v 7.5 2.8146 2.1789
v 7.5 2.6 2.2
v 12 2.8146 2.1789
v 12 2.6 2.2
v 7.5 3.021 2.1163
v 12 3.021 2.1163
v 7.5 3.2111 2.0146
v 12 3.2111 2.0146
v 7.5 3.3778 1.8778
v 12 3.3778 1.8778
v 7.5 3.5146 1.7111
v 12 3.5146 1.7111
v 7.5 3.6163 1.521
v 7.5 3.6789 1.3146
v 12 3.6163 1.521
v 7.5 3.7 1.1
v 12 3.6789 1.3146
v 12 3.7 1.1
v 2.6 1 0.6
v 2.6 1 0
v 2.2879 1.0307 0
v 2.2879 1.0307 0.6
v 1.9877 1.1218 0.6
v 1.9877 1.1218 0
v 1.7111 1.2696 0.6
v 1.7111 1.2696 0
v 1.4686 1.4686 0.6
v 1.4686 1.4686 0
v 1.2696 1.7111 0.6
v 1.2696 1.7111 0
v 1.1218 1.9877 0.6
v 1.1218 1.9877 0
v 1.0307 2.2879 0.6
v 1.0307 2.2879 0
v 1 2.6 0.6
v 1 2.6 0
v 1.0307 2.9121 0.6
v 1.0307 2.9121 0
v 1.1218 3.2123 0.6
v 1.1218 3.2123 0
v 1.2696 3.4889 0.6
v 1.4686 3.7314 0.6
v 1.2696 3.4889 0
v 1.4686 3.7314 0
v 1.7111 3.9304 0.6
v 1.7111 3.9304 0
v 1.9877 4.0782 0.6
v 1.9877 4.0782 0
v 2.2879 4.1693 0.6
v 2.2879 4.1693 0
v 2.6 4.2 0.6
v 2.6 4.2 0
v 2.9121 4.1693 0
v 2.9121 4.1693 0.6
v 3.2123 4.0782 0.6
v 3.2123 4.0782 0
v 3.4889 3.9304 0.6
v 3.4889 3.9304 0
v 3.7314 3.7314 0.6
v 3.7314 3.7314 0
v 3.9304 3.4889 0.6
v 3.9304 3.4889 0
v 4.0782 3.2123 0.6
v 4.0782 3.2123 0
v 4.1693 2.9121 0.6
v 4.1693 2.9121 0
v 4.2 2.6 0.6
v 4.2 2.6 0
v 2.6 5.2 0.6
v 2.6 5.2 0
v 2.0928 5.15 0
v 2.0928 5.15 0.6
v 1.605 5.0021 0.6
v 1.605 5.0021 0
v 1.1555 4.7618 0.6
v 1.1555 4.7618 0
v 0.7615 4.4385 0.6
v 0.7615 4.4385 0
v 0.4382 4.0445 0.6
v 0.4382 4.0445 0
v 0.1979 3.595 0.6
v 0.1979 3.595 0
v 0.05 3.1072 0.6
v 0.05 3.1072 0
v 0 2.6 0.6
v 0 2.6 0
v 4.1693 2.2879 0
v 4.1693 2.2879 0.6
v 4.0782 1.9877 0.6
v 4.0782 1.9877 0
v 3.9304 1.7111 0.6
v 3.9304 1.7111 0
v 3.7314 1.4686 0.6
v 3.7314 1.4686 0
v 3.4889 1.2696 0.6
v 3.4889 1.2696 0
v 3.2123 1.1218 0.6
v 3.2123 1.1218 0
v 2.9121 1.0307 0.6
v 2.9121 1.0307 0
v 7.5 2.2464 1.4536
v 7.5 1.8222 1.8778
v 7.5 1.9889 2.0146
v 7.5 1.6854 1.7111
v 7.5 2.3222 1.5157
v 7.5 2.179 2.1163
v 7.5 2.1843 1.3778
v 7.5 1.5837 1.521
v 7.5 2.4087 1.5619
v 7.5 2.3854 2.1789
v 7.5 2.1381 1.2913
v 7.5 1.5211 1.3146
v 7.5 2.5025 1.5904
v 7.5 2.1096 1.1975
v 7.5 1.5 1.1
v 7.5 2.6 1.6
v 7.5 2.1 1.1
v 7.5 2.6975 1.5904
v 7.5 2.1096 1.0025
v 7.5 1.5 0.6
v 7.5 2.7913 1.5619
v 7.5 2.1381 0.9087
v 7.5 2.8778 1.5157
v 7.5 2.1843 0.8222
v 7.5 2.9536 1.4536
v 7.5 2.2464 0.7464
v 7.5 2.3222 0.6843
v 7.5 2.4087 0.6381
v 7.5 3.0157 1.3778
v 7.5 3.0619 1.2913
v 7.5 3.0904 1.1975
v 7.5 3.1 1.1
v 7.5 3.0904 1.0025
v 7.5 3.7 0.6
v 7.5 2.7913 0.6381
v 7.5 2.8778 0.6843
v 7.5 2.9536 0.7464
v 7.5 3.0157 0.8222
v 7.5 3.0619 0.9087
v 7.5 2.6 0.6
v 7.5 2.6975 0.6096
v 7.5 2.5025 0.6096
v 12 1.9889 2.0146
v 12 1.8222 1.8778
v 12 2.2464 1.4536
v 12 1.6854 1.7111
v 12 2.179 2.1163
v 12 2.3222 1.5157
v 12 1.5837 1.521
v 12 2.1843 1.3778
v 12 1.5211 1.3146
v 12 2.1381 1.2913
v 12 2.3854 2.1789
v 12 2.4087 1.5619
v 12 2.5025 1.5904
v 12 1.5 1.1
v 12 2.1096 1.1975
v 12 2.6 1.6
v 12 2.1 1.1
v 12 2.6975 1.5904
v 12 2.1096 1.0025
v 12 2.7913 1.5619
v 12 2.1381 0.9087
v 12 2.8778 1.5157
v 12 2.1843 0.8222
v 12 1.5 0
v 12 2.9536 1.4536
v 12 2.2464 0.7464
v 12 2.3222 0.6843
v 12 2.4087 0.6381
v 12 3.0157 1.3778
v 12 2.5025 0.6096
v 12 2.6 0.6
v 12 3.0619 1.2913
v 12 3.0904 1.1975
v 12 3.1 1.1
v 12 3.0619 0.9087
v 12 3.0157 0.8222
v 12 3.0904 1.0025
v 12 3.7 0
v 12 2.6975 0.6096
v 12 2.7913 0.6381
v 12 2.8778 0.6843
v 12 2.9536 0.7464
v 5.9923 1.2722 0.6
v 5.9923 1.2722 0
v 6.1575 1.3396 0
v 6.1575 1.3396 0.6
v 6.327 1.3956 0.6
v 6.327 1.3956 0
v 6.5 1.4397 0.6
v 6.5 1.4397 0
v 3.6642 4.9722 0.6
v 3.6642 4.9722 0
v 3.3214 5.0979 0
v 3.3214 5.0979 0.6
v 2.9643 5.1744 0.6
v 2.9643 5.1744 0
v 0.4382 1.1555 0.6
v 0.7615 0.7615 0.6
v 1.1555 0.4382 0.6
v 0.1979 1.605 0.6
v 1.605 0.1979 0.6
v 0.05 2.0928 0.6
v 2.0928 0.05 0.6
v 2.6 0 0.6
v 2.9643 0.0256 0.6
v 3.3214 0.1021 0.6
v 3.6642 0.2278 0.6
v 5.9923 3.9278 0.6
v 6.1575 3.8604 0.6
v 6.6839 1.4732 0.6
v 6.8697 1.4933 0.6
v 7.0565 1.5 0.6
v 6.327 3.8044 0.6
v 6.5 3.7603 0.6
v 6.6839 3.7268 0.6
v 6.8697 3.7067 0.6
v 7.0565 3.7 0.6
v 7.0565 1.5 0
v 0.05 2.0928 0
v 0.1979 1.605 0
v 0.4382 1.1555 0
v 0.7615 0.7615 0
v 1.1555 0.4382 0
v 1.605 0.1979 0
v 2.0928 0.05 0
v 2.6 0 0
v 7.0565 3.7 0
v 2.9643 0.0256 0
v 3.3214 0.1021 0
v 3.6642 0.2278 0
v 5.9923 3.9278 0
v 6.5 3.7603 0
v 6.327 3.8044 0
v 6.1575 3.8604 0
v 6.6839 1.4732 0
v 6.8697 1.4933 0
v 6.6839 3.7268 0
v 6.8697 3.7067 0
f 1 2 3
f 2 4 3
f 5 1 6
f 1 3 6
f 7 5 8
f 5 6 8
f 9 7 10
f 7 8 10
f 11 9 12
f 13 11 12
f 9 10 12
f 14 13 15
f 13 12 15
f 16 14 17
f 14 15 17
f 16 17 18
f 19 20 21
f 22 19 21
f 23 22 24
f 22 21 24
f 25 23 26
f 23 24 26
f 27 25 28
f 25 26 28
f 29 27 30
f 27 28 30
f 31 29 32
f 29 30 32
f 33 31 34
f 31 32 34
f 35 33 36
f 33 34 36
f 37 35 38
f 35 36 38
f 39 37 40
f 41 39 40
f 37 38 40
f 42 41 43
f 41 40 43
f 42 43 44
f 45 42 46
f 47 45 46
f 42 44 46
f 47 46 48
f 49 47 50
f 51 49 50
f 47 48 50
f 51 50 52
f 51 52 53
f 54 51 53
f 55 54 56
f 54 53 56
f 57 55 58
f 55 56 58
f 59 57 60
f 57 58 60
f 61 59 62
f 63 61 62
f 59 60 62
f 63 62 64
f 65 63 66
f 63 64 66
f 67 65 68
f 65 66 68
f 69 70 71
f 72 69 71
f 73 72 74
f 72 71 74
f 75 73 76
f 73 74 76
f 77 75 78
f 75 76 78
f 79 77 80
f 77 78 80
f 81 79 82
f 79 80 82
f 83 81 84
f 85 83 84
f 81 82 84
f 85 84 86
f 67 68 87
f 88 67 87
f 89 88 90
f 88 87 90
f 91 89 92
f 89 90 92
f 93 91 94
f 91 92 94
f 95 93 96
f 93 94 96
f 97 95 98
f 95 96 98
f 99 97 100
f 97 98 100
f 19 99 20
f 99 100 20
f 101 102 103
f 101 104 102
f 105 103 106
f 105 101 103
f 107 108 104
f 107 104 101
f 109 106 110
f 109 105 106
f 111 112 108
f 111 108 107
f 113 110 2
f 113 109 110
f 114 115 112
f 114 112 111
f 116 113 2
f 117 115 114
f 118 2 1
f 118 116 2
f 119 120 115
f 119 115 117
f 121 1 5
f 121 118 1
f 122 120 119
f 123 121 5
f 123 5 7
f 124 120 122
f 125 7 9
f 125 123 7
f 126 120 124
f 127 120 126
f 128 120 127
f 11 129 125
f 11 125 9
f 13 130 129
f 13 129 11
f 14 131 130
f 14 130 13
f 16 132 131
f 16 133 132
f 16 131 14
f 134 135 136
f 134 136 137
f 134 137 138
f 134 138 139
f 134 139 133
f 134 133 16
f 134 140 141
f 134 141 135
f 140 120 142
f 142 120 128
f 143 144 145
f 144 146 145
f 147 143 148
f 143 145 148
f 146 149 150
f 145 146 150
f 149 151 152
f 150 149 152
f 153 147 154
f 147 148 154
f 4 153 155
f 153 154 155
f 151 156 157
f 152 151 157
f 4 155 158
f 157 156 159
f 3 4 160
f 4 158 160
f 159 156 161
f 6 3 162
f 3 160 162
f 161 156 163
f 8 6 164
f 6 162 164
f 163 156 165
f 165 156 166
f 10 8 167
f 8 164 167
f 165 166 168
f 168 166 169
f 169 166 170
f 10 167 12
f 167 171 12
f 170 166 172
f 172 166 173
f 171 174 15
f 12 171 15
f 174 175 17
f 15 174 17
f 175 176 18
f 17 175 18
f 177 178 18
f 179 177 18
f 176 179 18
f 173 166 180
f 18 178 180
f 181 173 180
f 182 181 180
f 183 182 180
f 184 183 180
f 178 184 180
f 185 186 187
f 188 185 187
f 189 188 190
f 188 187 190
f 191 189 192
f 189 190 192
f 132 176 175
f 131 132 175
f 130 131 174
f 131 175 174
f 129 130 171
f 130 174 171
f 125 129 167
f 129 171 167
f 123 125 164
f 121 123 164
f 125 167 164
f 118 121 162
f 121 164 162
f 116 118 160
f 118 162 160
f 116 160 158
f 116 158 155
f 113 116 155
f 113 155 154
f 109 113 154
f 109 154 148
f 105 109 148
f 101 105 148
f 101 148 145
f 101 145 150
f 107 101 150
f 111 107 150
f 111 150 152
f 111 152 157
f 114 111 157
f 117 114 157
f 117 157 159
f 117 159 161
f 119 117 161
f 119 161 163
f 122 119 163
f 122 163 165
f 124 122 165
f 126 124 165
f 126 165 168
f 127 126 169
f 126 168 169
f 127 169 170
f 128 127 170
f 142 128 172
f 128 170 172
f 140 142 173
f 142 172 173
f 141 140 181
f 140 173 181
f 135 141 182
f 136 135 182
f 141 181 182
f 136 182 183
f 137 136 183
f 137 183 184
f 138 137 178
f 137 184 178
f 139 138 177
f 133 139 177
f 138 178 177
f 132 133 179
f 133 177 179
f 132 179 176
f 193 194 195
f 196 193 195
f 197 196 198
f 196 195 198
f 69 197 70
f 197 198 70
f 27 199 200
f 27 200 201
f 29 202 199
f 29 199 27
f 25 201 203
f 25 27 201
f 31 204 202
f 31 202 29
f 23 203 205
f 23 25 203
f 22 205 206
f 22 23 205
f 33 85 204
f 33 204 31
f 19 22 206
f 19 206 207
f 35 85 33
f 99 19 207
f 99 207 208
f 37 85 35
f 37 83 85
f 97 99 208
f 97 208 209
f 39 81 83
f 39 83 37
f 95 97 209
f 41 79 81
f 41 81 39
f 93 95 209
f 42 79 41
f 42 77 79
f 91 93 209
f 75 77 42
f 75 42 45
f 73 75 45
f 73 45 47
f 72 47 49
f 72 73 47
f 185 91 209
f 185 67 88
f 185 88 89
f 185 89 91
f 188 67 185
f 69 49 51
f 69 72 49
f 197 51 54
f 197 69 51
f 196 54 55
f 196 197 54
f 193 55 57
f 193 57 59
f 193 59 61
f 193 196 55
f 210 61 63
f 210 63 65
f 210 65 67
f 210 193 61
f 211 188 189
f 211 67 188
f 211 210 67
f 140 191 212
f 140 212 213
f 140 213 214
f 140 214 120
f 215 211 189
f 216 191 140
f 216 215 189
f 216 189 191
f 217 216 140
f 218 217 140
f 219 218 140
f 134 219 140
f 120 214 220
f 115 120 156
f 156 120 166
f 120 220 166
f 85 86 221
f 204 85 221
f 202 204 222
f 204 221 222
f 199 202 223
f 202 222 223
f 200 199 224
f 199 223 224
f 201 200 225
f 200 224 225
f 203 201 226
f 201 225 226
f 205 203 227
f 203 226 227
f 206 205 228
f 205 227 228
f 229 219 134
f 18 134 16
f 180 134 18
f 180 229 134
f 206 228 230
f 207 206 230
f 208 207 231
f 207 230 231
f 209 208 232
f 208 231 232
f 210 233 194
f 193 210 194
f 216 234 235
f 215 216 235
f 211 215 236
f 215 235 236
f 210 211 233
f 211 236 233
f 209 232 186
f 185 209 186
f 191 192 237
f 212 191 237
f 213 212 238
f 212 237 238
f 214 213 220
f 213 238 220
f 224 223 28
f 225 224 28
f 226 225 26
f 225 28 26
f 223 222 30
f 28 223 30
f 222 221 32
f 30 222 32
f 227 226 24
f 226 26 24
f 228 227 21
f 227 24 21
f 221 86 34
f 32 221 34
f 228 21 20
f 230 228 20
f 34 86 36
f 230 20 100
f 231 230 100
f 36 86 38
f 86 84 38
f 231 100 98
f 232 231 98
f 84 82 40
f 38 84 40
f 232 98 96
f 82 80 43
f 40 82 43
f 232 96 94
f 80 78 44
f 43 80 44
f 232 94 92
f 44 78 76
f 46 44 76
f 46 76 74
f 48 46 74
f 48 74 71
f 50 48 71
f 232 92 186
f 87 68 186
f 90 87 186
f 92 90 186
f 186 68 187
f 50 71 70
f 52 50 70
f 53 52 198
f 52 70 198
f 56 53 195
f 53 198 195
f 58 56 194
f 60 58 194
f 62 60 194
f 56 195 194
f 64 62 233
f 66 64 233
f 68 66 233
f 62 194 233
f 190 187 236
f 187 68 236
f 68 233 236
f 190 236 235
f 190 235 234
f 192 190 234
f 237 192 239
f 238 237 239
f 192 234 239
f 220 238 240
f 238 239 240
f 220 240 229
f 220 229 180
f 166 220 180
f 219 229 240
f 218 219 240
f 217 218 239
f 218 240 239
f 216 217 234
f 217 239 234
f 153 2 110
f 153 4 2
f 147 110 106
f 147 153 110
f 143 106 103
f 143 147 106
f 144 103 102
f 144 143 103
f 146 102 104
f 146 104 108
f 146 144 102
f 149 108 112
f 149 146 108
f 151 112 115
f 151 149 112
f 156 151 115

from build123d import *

# Parameters (mm, degrees)
F0_W     = 4.5
F0_H     = 2.2
F1_DEPTH = 0.6
F2_W     = 4.5
F2_H     = 2.2
F3_DEPTH = 1.6
F4_R     = 1.09999
F5_R     = 0.5
F6_DEPTH = 25


# Not quite as in the source:
# - a fillet or chamfer is up to 0.001 mm smaller than in the source, because OpenCascade refuses the exact size


with BuildPart() as f1:
    # F0 (on Top) → F1 (new body)
    with BuildSketch(Plane.XY):
        with Locations((9.75, 2.6)):
            Rectangle(F0_W, F0_H)
        with BuildLine():
            Line((7.0565025569, 1.5), (7.5, 1.5))
            Line((7.5, 1.5), (7.5, 3.7))
            Line((7.5, 3.7), (7.0565025569, 3.7))
            ThreePointArc((7.0565025569, 3.7), (6.7766250144, 3.7151076306), (6.5, 3.7602549529))
            ThreePointArc((6.5, 3.7602549529), (6.2418088438, 3.8309365837), (5.9922537502, 3.9277912239))
            Line((5.9922537502, 3.9277912239), (3.6642488067, 4.9722087761))
            ThreePointArc((3.6642488067, 4.9722087761), (4.7825497586, 4.012967286), (5.2, 2.6))
            ThreePointArc((5.2, 2.6), (4.7825497586, 1.187032714), (3.6642488067, 0.2277912239))
            Line((3.6642488067, 0.2277912239), (5.9922537502, 1.2722087761))
            ThreePointArc((5.9922537502, 1.2722087761), (6.2418088438, 1.3690634163), (6.5, 1.4397450471))
            ThreePointArc((6.5, 1.4397450471), (6.7766250144, 1.4848923694), (7.0565025569, 1.5))
        make_face()
        with BuildLine():
            ThreePointArc((2.6, 0), (3.1441769851, 0.0575855159), (3.6642488067, 0.2277912239))
            ThreePointArc((3.6642488067, 0.2277912239), (4.7825497586, 1.187032714), (5.2, 2.6))
            ThreePointArc((5.2, 2.6), (4.7825497586, 4.012967286), (3.6642488067, 4.9722087761))
            ThreePointArc((3.6642488067, 4.9722087761), (3.1441769851, 5.1424144841), (2.6, 5.2))
            Line((2.6, 5.2), (2.6, 4.2))
            ThreePointArc((2.6, 4.2), (3.7313708499, 3.7313708499), (4.2, 2.6))
            ThreePointArc((4.2, 2.6), (3.7313708499, 1.4686291501), (2.6, 1))
            Line((2.6, 1), (2.6, 0))
        make_face()
        with BuildLine():
            ThreePointArc((0, 2.6), (0.7615223689, 0.7615223689), (2.6, 0))
            Line((2.6, 0), (2.6, 1))
            ThreePointArc((2.6, 1), (1, 2.6), (2.6, 4.2))
            Line((2.6, 4.2), (2.6, 5.2))
            ThreePointArc((2.6, 5.2), (0.7615223689, 4.4384776311), (0, 2.6))
        make_face()
    extrude(amount=F1_DEPTH)

    # F2 (on face) → F3 (join)
    with BuildSketch(Plane.XY.offset(0.6)):
        with Locations((9.75, 2.6)):
            Rectangle(F2_W, F2_H)
    extrude(amount=F3_DEPTH)

    # F4 (radius 1.1 in the source; OpenCascade refuses exactly that, so slightly less here)
    f4_edges = [f1.edges().sort_by_distance(p)[0] for p in [
        (9.75, 3.7, 2.2),
        (9.75, 1.5, 2.2),
    ]]
    fillet(f4_edges, radius=F4_R)

    # F5 (on face) → F6 (cut)
    with BuildSketch(Plane.YZ.offset(12)):
        with Locations((2.6, 1.1)):
            Circle(F5_R)
    extrude(amount=-F6_DEPTH, mode=Mode.SUBTRACT)


solid = f1.part
